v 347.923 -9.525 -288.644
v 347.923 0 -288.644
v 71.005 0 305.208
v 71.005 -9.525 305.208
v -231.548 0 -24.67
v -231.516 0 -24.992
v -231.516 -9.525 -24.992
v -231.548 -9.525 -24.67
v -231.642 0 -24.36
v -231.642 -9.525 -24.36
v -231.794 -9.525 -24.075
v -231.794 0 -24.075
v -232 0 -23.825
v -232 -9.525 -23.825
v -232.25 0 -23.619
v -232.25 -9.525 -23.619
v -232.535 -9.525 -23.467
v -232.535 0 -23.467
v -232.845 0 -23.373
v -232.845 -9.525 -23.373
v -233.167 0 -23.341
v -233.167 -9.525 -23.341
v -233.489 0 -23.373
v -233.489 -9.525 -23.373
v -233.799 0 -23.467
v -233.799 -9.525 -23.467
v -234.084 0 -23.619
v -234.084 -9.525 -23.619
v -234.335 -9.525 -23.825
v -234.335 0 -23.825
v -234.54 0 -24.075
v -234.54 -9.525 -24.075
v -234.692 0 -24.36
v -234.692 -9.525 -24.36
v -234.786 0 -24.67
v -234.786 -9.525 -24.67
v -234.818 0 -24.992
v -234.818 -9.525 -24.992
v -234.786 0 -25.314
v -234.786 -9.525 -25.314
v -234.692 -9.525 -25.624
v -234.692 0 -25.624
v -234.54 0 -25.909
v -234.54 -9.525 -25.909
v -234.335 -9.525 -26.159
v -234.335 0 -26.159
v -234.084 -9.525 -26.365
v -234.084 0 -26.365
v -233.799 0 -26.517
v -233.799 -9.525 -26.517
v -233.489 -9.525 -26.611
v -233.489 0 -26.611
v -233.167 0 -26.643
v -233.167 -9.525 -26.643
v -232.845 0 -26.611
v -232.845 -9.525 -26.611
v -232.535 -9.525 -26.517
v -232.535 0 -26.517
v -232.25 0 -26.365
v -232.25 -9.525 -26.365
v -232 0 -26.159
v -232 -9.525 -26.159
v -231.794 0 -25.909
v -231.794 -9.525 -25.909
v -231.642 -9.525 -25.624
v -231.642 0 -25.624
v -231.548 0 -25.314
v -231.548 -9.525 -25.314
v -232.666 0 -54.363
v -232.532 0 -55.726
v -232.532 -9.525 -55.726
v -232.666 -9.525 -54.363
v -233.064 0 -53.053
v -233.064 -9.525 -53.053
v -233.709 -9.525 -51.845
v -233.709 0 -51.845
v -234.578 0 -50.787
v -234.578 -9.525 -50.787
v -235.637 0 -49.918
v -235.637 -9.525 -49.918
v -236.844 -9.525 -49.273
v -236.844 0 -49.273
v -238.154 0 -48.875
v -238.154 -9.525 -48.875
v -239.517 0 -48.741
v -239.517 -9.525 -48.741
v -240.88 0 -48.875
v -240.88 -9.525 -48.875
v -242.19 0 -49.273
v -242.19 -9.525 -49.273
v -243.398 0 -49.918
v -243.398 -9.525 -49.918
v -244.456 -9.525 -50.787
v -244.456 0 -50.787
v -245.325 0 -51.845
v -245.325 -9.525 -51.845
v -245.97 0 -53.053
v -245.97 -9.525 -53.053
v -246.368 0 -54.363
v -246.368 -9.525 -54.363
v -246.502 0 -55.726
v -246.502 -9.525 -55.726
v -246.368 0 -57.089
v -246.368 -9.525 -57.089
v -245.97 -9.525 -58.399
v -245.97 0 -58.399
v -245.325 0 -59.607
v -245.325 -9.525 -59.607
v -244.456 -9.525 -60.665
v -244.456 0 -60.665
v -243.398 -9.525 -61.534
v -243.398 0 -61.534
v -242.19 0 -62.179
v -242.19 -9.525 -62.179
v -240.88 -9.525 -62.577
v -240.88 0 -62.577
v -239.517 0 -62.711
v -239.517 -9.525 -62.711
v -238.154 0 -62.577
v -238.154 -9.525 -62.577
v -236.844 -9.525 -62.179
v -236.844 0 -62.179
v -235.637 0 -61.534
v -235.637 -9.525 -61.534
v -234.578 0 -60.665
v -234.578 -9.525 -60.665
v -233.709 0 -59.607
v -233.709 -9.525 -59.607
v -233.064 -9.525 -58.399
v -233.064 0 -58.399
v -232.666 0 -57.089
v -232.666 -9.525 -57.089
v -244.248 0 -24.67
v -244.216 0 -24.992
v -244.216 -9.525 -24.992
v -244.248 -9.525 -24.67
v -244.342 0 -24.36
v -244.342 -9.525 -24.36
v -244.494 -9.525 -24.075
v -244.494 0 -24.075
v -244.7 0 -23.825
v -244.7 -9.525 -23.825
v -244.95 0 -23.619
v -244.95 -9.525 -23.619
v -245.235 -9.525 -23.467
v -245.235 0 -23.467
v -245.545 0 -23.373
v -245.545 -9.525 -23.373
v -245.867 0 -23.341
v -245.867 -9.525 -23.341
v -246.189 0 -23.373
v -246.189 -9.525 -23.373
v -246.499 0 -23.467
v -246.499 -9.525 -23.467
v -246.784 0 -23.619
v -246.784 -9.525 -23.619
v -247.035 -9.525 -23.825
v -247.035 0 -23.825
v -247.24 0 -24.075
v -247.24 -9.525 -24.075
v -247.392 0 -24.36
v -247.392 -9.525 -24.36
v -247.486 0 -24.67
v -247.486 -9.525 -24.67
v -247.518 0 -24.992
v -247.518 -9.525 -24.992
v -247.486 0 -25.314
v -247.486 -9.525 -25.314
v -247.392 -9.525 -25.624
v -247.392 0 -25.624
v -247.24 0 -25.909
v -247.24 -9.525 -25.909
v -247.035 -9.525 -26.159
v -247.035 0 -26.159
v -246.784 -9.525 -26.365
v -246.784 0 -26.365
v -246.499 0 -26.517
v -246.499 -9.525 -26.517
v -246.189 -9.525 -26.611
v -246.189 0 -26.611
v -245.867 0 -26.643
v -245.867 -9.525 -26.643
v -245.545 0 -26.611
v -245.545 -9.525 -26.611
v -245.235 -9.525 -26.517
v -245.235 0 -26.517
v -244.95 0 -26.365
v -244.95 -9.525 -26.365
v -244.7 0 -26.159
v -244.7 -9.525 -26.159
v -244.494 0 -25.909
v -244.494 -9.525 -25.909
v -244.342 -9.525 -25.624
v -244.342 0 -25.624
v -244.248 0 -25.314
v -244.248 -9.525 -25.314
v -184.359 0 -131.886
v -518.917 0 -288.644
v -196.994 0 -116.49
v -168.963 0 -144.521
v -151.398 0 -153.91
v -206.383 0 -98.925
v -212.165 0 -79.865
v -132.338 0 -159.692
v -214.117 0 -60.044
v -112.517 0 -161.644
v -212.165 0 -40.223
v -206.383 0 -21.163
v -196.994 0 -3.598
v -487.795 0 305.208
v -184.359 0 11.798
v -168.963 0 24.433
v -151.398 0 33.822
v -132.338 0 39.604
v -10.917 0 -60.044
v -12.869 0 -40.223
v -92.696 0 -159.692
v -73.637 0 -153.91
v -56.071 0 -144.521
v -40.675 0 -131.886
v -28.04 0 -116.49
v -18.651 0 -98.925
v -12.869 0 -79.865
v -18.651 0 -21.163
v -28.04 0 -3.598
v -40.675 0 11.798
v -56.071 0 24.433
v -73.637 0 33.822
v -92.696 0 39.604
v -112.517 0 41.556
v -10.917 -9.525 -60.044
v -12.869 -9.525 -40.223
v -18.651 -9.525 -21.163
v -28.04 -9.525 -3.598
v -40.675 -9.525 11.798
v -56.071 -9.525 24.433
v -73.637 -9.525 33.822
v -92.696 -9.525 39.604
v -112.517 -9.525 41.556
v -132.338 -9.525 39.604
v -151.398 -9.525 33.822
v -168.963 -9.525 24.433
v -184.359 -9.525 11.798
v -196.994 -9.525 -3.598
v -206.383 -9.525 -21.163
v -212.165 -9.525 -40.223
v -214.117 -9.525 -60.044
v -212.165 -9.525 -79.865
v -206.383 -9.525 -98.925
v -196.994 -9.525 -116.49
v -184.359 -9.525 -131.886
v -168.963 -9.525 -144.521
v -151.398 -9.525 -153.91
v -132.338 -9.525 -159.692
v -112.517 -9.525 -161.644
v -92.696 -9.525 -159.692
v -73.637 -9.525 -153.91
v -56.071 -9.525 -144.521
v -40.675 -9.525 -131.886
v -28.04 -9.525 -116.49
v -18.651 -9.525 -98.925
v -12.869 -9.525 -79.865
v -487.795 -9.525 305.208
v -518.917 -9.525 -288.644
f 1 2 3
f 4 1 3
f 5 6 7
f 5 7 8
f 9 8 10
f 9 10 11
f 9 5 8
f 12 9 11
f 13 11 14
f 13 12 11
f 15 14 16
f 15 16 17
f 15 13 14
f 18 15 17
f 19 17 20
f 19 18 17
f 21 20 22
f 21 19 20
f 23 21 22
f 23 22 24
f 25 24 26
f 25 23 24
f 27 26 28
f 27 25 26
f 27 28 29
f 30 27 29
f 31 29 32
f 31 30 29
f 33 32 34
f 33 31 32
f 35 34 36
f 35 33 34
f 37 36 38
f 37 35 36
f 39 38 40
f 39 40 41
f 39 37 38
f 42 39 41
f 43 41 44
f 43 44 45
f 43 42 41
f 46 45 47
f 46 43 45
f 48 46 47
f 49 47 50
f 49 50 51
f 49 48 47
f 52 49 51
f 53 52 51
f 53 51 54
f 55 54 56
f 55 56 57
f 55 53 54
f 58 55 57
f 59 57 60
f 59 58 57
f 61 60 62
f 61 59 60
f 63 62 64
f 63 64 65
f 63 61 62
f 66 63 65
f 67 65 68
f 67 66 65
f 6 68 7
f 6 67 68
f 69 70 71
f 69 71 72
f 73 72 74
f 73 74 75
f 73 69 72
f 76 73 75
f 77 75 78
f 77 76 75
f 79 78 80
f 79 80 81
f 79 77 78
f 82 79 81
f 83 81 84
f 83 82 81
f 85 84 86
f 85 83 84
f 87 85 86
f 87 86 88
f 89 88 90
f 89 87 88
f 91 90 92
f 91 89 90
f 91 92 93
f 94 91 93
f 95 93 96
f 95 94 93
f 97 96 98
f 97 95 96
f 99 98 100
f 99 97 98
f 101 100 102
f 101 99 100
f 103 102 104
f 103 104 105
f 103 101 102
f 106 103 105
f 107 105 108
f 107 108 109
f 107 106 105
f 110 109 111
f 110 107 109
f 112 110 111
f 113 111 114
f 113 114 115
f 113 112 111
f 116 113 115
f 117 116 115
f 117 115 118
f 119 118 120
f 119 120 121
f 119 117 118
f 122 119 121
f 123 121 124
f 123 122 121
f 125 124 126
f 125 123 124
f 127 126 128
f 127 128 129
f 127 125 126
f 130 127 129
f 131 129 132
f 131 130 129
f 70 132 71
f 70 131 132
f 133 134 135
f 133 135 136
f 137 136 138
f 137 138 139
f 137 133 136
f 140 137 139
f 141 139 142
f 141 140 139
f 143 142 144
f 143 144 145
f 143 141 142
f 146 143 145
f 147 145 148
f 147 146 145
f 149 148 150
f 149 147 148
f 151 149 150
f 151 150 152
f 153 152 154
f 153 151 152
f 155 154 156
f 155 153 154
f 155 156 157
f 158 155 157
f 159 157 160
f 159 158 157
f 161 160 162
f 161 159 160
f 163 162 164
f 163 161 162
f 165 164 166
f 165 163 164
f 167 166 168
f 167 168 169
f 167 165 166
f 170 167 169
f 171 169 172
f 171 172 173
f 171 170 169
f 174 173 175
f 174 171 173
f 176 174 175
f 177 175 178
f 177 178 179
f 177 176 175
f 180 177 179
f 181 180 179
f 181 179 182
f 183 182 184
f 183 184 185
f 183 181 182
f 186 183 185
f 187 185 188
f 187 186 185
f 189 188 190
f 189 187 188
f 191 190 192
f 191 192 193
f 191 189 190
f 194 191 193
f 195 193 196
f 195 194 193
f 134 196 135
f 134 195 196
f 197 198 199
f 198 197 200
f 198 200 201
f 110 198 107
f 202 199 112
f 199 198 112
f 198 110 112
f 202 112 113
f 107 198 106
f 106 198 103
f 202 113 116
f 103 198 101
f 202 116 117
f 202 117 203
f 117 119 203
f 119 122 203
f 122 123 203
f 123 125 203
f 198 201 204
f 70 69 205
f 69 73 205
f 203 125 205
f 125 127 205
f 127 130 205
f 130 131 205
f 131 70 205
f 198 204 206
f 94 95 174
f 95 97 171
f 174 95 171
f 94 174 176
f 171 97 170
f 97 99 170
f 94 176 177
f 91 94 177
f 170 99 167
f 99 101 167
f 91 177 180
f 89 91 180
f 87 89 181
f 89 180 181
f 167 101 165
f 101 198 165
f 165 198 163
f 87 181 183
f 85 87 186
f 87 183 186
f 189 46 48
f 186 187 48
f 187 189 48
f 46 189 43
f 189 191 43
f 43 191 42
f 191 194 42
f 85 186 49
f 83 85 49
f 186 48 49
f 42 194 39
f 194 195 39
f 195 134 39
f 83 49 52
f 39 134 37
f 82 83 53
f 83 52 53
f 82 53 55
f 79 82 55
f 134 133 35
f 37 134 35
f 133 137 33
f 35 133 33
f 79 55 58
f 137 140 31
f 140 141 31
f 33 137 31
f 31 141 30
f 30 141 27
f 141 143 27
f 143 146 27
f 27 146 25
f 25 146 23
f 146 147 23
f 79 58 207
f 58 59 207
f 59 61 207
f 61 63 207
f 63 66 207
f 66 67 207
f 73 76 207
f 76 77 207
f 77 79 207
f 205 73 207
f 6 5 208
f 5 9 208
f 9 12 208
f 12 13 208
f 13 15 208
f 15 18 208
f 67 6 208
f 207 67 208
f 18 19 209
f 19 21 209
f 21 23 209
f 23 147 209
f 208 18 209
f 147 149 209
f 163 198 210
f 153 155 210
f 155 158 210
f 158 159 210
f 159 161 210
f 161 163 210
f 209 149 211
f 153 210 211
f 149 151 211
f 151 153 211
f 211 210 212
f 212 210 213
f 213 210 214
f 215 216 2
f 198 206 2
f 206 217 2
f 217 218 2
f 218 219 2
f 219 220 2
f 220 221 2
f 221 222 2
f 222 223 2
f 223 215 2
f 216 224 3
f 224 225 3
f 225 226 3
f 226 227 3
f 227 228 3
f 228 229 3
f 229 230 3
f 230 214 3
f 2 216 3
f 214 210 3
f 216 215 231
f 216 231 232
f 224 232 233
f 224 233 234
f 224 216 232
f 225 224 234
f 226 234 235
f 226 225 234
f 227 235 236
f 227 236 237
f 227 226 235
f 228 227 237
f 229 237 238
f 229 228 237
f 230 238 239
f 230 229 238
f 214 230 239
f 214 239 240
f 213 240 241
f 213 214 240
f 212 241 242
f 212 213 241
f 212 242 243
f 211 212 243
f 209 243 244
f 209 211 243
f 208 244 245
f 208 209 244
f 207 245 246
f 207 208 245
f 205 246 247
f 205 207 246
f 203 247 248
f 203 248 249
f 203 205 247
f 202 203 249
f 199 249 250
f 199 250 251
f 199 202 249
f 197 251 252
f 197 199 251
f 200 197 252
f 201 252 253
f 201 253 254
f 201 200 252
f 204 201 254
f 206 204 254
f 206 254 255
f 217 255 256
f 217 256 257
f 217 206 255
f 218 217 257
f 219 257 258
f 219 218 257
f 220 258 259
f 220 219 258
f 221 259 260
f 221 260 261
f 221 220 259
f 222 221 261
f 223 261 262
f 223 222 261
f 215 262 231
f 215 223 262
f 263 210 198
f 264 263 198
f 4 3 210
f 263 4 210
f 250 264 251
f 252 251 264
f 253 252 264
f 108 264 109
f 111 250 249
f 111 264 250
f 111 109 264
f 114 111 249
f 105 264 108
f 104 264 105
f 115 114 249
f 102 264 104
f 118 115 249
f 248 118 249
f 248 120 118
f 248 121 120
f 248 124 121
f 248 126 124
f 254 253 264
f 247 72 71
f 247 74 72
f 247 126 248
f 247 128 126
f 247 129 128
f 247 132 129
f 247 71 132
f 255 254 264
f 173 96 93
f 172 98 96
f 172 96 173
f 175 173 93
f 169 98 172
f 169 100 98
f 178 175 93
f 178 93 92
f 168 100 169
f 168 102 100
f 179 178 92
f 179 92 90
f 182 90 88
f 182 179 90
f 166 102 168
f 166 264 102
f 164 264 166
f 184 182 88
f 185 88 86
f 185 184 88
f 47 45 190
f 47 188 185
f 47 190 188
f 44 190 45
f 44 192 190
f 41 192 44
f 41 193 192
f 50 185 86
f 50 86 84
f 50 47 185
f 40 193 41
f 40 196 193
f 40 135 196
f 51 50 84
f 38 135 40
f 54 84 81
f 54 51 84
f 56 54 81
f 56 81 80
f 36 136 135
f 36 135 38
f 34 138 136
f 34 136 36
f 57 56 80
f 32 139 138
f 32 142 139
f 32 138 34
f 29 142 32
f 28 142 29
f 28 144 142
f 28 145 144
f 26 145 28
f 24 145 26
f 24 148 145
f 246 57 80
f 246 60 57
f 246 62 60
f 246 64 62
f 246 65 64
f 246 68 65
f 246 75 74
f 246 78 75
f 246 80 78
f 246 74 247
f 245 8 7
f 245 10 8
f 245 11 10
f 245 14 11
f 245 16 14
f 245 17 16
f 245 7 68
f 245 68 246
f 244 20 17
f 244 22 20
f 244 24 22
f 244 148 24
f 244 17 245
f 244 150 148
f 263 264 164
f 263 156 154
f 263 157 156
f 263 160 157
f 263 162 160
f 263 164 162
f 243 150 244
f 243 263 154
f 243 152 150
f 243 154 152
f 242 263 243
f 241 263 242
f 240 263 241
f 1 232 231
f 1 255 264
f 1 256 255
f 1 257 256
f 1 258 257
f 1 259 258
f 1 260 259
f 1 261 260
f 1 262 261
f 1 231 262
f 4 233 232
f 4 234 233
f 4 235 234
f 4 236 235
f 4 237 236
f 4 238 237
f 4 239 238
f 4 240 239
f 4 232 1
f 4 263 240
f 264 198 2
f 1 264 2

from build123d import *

# Parameters (mm, degrees)
F0_R     = 6.985
F0_R_2   = 1.651
F0_R_3   = 101.6
F1_DEPTH = 9.525


with BuildPart() as f1:
    # F0 (on Front) → F1 (new body)
    with BuildSketch(Plane.XZ):
        Polygon((-487.794698, 305.207996), (-518.917162, -288.644004), (347.923038, -288.644004), (71.005302, 305.207996), align=None)
        with Locations((-239.517162, -55.726004)):
            Circle(F0_R, mode=Mode.SUBTRACT)
        with Locations((-245.867162, -24.992004)):
            Circle(F0_R_2, mode=Mode.SUBTRACT)
        with Locations((-233.167162, -24.992004)):
            Circle(F0_R_2, mode=Mode.SUBTRACT)
        with Locations((-112.517162, -60.044004)):
            Circle(F0_R_3, mode=Mode.SUBTRACT)
    extrude(amount=F1_DEPTH)


solid = f1.part
